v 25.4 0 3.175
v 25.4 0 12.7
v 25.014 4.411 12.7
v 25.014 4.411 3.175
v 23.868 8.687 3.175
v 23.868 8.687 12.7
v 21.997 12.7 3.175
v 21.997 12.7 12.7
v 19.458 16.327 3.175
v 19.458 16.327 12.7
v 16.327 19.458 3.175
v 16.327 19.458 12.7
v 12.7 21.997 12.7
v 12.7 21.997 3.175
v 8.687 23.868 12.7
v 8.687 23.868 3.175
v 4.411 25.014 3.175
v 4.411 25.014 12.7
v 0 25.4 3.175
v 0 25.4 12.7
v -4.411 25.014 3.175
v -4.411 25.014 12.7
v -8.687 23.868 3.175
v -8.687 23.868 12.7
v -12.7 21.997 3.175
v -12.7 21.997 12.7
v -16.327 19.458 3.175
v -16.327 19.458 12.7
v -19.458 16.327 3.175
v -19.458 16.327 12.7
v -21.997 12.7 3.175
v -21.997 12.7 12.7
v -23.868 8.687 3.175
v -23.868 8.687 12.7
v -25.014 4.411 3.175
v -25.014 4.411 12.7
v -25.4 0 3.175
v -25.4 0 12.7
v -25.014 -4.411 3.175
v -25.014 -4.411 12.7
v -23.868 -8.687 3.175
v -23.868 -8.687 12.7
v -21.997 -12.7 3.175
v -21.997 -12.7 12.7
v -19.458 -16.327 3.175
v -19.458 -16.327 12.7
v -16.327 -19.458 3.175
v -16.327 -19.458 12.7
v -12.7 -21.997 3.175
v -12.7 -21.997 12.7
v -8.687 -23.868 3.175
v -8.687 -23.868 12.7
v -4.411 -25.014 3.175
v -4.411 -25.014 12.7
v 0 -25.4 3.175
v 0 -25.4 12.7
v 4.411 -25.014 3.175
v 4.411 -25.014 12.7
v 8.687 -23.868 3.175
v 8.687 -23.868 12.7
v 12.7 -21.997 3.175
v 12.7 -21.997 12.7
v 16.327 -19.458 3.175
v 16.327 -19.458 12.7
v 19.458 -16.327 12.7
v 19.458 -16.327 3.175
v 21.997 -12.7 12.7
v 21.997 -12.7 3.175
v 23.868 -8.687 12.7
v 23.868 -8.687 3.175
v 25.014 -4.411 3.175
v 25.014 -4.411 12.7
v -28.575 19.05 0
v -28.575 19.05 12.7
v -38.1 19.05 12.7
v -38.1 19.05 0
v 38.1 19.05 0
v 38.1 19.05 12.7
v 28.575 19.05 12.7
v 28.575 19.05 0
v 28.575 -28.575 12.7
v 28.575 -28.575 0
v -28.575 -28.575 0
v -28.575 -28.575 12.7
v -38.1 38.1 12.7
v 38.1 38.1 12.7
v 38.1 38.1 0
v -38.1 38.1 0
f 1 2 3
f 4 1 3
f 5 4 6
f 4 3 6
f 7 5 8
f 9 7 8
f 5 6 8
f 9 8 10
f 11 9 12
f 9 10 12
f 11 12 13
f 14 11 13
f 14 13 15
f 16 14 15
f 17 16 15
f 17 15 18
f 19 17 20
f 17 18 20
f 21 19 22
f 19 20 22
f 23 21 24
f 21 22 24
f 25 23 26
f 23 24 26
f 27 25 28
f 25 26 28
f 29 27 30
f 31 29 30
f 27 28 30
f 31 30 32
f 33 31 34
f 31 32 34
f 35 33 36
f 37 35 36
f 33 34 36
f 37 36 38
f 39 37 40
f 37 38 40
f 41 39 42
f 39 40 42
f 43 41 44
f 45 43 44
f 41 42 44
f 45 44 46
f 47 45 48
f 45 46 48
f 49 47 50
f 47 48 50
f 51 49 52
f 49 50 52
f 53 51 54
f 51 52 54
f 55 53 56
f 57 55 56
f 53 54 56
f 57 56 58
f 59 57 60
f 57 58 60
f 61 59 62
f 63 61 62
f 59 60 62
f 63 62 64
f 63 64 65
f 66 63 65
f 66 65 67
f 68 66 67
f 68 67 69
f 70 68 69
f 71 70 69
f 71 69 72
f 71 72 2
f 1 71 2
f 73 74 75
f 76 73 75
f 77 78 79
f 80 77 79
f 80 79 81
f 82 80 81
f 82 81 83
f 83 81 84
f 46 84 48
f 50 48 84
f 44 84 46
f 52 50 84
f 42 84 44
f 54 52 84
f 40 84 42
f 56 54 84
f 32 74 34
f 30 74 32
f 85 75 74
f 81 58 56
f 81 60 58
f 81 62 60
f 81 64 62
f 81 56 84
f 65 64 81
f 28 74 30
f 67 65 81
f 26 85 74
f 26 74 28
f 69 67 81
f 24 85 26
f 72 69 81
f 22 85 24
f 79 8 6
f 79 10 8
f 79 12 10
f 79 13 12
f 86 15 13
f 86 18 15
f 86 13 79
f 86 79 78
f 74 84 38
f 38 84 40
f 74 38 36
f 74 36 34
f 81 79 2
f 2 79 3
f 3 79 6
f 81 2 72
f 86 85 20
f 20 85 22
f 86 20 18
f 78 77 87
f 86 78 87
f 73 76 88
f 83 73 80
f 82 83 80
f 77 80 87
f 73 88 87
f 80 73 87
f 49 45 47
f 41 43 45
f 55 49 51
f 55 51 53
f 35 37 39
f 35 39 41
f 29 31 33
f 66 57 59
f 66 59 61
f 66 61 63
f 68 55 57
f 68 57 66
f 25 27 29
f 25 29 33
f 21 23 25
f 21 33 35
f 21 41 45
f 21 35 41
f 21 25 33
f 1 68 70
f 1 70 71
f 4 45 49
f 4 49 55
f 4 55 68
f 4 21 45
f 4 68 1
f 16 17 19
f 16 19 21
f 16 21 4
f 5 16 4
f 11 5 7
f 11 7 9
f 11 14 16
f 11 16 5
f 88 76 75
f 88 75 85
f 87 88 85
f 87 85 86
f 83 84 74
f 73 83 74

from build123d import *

# Parameters (mm, degrees)
SKETCH1_W               = 76.2
SKETCH1_H               = 76.2
BOSS_EXTRUDE1_DEPTH     = 12.7
SKETCH2_R               = 25.4
CUT_EXTRUDE1_DEPTH      = 9.525
CUT_EXTRUDE3_DEPTH      = 1
CUT_EXTRUDE3_DEPTH_BACK = 13.7


with BuildPart() as part:
    # Sketch1 → Boss-Extrude1 (new body)
    with BuildSketch(Plane.XY):
        Rectangle(SKETCH1_W, SKETCH1_H)
    extrude(amount=BOSS_EXTRUDE1_DEPTH)

    # Sketch2 → Cut-Extrude1 (cut)
    with BuildSketch(Plane.XY.offset(12.7)):
        Circle(SKETCH2_R)
    extrude(amount=-CUT_EXTRUDE1_DEPTH, mode=Mode.SUBTRACT)

    # Sketch3 → Cut-Extrude3 (cut, two sides)
    with BuildSketch(Plane.XY.offset(12.7)) as cut_extrude3_sk:
        Polygon((238.6, 19.05), (38.1, 19.05), (28.575, 19.05), (28.575, -28.575), (-28.575, -28.575), (-28.575, 19.05), (-38.1, 19.05), (-238.6, 19.05), (-238.6, -381.95), (238.6, -381.95), align=None)
    extrude(amount=CUT_EXTRUDE3_DEPTH, mode=Mode.SUBTRACT)
    extrude(cut_extrude3_sk.sketch, amount=-CUT_EXTRUDE3_DEPTH_BACK, mode=Mode.SUBTRACT)


solid = part.part
